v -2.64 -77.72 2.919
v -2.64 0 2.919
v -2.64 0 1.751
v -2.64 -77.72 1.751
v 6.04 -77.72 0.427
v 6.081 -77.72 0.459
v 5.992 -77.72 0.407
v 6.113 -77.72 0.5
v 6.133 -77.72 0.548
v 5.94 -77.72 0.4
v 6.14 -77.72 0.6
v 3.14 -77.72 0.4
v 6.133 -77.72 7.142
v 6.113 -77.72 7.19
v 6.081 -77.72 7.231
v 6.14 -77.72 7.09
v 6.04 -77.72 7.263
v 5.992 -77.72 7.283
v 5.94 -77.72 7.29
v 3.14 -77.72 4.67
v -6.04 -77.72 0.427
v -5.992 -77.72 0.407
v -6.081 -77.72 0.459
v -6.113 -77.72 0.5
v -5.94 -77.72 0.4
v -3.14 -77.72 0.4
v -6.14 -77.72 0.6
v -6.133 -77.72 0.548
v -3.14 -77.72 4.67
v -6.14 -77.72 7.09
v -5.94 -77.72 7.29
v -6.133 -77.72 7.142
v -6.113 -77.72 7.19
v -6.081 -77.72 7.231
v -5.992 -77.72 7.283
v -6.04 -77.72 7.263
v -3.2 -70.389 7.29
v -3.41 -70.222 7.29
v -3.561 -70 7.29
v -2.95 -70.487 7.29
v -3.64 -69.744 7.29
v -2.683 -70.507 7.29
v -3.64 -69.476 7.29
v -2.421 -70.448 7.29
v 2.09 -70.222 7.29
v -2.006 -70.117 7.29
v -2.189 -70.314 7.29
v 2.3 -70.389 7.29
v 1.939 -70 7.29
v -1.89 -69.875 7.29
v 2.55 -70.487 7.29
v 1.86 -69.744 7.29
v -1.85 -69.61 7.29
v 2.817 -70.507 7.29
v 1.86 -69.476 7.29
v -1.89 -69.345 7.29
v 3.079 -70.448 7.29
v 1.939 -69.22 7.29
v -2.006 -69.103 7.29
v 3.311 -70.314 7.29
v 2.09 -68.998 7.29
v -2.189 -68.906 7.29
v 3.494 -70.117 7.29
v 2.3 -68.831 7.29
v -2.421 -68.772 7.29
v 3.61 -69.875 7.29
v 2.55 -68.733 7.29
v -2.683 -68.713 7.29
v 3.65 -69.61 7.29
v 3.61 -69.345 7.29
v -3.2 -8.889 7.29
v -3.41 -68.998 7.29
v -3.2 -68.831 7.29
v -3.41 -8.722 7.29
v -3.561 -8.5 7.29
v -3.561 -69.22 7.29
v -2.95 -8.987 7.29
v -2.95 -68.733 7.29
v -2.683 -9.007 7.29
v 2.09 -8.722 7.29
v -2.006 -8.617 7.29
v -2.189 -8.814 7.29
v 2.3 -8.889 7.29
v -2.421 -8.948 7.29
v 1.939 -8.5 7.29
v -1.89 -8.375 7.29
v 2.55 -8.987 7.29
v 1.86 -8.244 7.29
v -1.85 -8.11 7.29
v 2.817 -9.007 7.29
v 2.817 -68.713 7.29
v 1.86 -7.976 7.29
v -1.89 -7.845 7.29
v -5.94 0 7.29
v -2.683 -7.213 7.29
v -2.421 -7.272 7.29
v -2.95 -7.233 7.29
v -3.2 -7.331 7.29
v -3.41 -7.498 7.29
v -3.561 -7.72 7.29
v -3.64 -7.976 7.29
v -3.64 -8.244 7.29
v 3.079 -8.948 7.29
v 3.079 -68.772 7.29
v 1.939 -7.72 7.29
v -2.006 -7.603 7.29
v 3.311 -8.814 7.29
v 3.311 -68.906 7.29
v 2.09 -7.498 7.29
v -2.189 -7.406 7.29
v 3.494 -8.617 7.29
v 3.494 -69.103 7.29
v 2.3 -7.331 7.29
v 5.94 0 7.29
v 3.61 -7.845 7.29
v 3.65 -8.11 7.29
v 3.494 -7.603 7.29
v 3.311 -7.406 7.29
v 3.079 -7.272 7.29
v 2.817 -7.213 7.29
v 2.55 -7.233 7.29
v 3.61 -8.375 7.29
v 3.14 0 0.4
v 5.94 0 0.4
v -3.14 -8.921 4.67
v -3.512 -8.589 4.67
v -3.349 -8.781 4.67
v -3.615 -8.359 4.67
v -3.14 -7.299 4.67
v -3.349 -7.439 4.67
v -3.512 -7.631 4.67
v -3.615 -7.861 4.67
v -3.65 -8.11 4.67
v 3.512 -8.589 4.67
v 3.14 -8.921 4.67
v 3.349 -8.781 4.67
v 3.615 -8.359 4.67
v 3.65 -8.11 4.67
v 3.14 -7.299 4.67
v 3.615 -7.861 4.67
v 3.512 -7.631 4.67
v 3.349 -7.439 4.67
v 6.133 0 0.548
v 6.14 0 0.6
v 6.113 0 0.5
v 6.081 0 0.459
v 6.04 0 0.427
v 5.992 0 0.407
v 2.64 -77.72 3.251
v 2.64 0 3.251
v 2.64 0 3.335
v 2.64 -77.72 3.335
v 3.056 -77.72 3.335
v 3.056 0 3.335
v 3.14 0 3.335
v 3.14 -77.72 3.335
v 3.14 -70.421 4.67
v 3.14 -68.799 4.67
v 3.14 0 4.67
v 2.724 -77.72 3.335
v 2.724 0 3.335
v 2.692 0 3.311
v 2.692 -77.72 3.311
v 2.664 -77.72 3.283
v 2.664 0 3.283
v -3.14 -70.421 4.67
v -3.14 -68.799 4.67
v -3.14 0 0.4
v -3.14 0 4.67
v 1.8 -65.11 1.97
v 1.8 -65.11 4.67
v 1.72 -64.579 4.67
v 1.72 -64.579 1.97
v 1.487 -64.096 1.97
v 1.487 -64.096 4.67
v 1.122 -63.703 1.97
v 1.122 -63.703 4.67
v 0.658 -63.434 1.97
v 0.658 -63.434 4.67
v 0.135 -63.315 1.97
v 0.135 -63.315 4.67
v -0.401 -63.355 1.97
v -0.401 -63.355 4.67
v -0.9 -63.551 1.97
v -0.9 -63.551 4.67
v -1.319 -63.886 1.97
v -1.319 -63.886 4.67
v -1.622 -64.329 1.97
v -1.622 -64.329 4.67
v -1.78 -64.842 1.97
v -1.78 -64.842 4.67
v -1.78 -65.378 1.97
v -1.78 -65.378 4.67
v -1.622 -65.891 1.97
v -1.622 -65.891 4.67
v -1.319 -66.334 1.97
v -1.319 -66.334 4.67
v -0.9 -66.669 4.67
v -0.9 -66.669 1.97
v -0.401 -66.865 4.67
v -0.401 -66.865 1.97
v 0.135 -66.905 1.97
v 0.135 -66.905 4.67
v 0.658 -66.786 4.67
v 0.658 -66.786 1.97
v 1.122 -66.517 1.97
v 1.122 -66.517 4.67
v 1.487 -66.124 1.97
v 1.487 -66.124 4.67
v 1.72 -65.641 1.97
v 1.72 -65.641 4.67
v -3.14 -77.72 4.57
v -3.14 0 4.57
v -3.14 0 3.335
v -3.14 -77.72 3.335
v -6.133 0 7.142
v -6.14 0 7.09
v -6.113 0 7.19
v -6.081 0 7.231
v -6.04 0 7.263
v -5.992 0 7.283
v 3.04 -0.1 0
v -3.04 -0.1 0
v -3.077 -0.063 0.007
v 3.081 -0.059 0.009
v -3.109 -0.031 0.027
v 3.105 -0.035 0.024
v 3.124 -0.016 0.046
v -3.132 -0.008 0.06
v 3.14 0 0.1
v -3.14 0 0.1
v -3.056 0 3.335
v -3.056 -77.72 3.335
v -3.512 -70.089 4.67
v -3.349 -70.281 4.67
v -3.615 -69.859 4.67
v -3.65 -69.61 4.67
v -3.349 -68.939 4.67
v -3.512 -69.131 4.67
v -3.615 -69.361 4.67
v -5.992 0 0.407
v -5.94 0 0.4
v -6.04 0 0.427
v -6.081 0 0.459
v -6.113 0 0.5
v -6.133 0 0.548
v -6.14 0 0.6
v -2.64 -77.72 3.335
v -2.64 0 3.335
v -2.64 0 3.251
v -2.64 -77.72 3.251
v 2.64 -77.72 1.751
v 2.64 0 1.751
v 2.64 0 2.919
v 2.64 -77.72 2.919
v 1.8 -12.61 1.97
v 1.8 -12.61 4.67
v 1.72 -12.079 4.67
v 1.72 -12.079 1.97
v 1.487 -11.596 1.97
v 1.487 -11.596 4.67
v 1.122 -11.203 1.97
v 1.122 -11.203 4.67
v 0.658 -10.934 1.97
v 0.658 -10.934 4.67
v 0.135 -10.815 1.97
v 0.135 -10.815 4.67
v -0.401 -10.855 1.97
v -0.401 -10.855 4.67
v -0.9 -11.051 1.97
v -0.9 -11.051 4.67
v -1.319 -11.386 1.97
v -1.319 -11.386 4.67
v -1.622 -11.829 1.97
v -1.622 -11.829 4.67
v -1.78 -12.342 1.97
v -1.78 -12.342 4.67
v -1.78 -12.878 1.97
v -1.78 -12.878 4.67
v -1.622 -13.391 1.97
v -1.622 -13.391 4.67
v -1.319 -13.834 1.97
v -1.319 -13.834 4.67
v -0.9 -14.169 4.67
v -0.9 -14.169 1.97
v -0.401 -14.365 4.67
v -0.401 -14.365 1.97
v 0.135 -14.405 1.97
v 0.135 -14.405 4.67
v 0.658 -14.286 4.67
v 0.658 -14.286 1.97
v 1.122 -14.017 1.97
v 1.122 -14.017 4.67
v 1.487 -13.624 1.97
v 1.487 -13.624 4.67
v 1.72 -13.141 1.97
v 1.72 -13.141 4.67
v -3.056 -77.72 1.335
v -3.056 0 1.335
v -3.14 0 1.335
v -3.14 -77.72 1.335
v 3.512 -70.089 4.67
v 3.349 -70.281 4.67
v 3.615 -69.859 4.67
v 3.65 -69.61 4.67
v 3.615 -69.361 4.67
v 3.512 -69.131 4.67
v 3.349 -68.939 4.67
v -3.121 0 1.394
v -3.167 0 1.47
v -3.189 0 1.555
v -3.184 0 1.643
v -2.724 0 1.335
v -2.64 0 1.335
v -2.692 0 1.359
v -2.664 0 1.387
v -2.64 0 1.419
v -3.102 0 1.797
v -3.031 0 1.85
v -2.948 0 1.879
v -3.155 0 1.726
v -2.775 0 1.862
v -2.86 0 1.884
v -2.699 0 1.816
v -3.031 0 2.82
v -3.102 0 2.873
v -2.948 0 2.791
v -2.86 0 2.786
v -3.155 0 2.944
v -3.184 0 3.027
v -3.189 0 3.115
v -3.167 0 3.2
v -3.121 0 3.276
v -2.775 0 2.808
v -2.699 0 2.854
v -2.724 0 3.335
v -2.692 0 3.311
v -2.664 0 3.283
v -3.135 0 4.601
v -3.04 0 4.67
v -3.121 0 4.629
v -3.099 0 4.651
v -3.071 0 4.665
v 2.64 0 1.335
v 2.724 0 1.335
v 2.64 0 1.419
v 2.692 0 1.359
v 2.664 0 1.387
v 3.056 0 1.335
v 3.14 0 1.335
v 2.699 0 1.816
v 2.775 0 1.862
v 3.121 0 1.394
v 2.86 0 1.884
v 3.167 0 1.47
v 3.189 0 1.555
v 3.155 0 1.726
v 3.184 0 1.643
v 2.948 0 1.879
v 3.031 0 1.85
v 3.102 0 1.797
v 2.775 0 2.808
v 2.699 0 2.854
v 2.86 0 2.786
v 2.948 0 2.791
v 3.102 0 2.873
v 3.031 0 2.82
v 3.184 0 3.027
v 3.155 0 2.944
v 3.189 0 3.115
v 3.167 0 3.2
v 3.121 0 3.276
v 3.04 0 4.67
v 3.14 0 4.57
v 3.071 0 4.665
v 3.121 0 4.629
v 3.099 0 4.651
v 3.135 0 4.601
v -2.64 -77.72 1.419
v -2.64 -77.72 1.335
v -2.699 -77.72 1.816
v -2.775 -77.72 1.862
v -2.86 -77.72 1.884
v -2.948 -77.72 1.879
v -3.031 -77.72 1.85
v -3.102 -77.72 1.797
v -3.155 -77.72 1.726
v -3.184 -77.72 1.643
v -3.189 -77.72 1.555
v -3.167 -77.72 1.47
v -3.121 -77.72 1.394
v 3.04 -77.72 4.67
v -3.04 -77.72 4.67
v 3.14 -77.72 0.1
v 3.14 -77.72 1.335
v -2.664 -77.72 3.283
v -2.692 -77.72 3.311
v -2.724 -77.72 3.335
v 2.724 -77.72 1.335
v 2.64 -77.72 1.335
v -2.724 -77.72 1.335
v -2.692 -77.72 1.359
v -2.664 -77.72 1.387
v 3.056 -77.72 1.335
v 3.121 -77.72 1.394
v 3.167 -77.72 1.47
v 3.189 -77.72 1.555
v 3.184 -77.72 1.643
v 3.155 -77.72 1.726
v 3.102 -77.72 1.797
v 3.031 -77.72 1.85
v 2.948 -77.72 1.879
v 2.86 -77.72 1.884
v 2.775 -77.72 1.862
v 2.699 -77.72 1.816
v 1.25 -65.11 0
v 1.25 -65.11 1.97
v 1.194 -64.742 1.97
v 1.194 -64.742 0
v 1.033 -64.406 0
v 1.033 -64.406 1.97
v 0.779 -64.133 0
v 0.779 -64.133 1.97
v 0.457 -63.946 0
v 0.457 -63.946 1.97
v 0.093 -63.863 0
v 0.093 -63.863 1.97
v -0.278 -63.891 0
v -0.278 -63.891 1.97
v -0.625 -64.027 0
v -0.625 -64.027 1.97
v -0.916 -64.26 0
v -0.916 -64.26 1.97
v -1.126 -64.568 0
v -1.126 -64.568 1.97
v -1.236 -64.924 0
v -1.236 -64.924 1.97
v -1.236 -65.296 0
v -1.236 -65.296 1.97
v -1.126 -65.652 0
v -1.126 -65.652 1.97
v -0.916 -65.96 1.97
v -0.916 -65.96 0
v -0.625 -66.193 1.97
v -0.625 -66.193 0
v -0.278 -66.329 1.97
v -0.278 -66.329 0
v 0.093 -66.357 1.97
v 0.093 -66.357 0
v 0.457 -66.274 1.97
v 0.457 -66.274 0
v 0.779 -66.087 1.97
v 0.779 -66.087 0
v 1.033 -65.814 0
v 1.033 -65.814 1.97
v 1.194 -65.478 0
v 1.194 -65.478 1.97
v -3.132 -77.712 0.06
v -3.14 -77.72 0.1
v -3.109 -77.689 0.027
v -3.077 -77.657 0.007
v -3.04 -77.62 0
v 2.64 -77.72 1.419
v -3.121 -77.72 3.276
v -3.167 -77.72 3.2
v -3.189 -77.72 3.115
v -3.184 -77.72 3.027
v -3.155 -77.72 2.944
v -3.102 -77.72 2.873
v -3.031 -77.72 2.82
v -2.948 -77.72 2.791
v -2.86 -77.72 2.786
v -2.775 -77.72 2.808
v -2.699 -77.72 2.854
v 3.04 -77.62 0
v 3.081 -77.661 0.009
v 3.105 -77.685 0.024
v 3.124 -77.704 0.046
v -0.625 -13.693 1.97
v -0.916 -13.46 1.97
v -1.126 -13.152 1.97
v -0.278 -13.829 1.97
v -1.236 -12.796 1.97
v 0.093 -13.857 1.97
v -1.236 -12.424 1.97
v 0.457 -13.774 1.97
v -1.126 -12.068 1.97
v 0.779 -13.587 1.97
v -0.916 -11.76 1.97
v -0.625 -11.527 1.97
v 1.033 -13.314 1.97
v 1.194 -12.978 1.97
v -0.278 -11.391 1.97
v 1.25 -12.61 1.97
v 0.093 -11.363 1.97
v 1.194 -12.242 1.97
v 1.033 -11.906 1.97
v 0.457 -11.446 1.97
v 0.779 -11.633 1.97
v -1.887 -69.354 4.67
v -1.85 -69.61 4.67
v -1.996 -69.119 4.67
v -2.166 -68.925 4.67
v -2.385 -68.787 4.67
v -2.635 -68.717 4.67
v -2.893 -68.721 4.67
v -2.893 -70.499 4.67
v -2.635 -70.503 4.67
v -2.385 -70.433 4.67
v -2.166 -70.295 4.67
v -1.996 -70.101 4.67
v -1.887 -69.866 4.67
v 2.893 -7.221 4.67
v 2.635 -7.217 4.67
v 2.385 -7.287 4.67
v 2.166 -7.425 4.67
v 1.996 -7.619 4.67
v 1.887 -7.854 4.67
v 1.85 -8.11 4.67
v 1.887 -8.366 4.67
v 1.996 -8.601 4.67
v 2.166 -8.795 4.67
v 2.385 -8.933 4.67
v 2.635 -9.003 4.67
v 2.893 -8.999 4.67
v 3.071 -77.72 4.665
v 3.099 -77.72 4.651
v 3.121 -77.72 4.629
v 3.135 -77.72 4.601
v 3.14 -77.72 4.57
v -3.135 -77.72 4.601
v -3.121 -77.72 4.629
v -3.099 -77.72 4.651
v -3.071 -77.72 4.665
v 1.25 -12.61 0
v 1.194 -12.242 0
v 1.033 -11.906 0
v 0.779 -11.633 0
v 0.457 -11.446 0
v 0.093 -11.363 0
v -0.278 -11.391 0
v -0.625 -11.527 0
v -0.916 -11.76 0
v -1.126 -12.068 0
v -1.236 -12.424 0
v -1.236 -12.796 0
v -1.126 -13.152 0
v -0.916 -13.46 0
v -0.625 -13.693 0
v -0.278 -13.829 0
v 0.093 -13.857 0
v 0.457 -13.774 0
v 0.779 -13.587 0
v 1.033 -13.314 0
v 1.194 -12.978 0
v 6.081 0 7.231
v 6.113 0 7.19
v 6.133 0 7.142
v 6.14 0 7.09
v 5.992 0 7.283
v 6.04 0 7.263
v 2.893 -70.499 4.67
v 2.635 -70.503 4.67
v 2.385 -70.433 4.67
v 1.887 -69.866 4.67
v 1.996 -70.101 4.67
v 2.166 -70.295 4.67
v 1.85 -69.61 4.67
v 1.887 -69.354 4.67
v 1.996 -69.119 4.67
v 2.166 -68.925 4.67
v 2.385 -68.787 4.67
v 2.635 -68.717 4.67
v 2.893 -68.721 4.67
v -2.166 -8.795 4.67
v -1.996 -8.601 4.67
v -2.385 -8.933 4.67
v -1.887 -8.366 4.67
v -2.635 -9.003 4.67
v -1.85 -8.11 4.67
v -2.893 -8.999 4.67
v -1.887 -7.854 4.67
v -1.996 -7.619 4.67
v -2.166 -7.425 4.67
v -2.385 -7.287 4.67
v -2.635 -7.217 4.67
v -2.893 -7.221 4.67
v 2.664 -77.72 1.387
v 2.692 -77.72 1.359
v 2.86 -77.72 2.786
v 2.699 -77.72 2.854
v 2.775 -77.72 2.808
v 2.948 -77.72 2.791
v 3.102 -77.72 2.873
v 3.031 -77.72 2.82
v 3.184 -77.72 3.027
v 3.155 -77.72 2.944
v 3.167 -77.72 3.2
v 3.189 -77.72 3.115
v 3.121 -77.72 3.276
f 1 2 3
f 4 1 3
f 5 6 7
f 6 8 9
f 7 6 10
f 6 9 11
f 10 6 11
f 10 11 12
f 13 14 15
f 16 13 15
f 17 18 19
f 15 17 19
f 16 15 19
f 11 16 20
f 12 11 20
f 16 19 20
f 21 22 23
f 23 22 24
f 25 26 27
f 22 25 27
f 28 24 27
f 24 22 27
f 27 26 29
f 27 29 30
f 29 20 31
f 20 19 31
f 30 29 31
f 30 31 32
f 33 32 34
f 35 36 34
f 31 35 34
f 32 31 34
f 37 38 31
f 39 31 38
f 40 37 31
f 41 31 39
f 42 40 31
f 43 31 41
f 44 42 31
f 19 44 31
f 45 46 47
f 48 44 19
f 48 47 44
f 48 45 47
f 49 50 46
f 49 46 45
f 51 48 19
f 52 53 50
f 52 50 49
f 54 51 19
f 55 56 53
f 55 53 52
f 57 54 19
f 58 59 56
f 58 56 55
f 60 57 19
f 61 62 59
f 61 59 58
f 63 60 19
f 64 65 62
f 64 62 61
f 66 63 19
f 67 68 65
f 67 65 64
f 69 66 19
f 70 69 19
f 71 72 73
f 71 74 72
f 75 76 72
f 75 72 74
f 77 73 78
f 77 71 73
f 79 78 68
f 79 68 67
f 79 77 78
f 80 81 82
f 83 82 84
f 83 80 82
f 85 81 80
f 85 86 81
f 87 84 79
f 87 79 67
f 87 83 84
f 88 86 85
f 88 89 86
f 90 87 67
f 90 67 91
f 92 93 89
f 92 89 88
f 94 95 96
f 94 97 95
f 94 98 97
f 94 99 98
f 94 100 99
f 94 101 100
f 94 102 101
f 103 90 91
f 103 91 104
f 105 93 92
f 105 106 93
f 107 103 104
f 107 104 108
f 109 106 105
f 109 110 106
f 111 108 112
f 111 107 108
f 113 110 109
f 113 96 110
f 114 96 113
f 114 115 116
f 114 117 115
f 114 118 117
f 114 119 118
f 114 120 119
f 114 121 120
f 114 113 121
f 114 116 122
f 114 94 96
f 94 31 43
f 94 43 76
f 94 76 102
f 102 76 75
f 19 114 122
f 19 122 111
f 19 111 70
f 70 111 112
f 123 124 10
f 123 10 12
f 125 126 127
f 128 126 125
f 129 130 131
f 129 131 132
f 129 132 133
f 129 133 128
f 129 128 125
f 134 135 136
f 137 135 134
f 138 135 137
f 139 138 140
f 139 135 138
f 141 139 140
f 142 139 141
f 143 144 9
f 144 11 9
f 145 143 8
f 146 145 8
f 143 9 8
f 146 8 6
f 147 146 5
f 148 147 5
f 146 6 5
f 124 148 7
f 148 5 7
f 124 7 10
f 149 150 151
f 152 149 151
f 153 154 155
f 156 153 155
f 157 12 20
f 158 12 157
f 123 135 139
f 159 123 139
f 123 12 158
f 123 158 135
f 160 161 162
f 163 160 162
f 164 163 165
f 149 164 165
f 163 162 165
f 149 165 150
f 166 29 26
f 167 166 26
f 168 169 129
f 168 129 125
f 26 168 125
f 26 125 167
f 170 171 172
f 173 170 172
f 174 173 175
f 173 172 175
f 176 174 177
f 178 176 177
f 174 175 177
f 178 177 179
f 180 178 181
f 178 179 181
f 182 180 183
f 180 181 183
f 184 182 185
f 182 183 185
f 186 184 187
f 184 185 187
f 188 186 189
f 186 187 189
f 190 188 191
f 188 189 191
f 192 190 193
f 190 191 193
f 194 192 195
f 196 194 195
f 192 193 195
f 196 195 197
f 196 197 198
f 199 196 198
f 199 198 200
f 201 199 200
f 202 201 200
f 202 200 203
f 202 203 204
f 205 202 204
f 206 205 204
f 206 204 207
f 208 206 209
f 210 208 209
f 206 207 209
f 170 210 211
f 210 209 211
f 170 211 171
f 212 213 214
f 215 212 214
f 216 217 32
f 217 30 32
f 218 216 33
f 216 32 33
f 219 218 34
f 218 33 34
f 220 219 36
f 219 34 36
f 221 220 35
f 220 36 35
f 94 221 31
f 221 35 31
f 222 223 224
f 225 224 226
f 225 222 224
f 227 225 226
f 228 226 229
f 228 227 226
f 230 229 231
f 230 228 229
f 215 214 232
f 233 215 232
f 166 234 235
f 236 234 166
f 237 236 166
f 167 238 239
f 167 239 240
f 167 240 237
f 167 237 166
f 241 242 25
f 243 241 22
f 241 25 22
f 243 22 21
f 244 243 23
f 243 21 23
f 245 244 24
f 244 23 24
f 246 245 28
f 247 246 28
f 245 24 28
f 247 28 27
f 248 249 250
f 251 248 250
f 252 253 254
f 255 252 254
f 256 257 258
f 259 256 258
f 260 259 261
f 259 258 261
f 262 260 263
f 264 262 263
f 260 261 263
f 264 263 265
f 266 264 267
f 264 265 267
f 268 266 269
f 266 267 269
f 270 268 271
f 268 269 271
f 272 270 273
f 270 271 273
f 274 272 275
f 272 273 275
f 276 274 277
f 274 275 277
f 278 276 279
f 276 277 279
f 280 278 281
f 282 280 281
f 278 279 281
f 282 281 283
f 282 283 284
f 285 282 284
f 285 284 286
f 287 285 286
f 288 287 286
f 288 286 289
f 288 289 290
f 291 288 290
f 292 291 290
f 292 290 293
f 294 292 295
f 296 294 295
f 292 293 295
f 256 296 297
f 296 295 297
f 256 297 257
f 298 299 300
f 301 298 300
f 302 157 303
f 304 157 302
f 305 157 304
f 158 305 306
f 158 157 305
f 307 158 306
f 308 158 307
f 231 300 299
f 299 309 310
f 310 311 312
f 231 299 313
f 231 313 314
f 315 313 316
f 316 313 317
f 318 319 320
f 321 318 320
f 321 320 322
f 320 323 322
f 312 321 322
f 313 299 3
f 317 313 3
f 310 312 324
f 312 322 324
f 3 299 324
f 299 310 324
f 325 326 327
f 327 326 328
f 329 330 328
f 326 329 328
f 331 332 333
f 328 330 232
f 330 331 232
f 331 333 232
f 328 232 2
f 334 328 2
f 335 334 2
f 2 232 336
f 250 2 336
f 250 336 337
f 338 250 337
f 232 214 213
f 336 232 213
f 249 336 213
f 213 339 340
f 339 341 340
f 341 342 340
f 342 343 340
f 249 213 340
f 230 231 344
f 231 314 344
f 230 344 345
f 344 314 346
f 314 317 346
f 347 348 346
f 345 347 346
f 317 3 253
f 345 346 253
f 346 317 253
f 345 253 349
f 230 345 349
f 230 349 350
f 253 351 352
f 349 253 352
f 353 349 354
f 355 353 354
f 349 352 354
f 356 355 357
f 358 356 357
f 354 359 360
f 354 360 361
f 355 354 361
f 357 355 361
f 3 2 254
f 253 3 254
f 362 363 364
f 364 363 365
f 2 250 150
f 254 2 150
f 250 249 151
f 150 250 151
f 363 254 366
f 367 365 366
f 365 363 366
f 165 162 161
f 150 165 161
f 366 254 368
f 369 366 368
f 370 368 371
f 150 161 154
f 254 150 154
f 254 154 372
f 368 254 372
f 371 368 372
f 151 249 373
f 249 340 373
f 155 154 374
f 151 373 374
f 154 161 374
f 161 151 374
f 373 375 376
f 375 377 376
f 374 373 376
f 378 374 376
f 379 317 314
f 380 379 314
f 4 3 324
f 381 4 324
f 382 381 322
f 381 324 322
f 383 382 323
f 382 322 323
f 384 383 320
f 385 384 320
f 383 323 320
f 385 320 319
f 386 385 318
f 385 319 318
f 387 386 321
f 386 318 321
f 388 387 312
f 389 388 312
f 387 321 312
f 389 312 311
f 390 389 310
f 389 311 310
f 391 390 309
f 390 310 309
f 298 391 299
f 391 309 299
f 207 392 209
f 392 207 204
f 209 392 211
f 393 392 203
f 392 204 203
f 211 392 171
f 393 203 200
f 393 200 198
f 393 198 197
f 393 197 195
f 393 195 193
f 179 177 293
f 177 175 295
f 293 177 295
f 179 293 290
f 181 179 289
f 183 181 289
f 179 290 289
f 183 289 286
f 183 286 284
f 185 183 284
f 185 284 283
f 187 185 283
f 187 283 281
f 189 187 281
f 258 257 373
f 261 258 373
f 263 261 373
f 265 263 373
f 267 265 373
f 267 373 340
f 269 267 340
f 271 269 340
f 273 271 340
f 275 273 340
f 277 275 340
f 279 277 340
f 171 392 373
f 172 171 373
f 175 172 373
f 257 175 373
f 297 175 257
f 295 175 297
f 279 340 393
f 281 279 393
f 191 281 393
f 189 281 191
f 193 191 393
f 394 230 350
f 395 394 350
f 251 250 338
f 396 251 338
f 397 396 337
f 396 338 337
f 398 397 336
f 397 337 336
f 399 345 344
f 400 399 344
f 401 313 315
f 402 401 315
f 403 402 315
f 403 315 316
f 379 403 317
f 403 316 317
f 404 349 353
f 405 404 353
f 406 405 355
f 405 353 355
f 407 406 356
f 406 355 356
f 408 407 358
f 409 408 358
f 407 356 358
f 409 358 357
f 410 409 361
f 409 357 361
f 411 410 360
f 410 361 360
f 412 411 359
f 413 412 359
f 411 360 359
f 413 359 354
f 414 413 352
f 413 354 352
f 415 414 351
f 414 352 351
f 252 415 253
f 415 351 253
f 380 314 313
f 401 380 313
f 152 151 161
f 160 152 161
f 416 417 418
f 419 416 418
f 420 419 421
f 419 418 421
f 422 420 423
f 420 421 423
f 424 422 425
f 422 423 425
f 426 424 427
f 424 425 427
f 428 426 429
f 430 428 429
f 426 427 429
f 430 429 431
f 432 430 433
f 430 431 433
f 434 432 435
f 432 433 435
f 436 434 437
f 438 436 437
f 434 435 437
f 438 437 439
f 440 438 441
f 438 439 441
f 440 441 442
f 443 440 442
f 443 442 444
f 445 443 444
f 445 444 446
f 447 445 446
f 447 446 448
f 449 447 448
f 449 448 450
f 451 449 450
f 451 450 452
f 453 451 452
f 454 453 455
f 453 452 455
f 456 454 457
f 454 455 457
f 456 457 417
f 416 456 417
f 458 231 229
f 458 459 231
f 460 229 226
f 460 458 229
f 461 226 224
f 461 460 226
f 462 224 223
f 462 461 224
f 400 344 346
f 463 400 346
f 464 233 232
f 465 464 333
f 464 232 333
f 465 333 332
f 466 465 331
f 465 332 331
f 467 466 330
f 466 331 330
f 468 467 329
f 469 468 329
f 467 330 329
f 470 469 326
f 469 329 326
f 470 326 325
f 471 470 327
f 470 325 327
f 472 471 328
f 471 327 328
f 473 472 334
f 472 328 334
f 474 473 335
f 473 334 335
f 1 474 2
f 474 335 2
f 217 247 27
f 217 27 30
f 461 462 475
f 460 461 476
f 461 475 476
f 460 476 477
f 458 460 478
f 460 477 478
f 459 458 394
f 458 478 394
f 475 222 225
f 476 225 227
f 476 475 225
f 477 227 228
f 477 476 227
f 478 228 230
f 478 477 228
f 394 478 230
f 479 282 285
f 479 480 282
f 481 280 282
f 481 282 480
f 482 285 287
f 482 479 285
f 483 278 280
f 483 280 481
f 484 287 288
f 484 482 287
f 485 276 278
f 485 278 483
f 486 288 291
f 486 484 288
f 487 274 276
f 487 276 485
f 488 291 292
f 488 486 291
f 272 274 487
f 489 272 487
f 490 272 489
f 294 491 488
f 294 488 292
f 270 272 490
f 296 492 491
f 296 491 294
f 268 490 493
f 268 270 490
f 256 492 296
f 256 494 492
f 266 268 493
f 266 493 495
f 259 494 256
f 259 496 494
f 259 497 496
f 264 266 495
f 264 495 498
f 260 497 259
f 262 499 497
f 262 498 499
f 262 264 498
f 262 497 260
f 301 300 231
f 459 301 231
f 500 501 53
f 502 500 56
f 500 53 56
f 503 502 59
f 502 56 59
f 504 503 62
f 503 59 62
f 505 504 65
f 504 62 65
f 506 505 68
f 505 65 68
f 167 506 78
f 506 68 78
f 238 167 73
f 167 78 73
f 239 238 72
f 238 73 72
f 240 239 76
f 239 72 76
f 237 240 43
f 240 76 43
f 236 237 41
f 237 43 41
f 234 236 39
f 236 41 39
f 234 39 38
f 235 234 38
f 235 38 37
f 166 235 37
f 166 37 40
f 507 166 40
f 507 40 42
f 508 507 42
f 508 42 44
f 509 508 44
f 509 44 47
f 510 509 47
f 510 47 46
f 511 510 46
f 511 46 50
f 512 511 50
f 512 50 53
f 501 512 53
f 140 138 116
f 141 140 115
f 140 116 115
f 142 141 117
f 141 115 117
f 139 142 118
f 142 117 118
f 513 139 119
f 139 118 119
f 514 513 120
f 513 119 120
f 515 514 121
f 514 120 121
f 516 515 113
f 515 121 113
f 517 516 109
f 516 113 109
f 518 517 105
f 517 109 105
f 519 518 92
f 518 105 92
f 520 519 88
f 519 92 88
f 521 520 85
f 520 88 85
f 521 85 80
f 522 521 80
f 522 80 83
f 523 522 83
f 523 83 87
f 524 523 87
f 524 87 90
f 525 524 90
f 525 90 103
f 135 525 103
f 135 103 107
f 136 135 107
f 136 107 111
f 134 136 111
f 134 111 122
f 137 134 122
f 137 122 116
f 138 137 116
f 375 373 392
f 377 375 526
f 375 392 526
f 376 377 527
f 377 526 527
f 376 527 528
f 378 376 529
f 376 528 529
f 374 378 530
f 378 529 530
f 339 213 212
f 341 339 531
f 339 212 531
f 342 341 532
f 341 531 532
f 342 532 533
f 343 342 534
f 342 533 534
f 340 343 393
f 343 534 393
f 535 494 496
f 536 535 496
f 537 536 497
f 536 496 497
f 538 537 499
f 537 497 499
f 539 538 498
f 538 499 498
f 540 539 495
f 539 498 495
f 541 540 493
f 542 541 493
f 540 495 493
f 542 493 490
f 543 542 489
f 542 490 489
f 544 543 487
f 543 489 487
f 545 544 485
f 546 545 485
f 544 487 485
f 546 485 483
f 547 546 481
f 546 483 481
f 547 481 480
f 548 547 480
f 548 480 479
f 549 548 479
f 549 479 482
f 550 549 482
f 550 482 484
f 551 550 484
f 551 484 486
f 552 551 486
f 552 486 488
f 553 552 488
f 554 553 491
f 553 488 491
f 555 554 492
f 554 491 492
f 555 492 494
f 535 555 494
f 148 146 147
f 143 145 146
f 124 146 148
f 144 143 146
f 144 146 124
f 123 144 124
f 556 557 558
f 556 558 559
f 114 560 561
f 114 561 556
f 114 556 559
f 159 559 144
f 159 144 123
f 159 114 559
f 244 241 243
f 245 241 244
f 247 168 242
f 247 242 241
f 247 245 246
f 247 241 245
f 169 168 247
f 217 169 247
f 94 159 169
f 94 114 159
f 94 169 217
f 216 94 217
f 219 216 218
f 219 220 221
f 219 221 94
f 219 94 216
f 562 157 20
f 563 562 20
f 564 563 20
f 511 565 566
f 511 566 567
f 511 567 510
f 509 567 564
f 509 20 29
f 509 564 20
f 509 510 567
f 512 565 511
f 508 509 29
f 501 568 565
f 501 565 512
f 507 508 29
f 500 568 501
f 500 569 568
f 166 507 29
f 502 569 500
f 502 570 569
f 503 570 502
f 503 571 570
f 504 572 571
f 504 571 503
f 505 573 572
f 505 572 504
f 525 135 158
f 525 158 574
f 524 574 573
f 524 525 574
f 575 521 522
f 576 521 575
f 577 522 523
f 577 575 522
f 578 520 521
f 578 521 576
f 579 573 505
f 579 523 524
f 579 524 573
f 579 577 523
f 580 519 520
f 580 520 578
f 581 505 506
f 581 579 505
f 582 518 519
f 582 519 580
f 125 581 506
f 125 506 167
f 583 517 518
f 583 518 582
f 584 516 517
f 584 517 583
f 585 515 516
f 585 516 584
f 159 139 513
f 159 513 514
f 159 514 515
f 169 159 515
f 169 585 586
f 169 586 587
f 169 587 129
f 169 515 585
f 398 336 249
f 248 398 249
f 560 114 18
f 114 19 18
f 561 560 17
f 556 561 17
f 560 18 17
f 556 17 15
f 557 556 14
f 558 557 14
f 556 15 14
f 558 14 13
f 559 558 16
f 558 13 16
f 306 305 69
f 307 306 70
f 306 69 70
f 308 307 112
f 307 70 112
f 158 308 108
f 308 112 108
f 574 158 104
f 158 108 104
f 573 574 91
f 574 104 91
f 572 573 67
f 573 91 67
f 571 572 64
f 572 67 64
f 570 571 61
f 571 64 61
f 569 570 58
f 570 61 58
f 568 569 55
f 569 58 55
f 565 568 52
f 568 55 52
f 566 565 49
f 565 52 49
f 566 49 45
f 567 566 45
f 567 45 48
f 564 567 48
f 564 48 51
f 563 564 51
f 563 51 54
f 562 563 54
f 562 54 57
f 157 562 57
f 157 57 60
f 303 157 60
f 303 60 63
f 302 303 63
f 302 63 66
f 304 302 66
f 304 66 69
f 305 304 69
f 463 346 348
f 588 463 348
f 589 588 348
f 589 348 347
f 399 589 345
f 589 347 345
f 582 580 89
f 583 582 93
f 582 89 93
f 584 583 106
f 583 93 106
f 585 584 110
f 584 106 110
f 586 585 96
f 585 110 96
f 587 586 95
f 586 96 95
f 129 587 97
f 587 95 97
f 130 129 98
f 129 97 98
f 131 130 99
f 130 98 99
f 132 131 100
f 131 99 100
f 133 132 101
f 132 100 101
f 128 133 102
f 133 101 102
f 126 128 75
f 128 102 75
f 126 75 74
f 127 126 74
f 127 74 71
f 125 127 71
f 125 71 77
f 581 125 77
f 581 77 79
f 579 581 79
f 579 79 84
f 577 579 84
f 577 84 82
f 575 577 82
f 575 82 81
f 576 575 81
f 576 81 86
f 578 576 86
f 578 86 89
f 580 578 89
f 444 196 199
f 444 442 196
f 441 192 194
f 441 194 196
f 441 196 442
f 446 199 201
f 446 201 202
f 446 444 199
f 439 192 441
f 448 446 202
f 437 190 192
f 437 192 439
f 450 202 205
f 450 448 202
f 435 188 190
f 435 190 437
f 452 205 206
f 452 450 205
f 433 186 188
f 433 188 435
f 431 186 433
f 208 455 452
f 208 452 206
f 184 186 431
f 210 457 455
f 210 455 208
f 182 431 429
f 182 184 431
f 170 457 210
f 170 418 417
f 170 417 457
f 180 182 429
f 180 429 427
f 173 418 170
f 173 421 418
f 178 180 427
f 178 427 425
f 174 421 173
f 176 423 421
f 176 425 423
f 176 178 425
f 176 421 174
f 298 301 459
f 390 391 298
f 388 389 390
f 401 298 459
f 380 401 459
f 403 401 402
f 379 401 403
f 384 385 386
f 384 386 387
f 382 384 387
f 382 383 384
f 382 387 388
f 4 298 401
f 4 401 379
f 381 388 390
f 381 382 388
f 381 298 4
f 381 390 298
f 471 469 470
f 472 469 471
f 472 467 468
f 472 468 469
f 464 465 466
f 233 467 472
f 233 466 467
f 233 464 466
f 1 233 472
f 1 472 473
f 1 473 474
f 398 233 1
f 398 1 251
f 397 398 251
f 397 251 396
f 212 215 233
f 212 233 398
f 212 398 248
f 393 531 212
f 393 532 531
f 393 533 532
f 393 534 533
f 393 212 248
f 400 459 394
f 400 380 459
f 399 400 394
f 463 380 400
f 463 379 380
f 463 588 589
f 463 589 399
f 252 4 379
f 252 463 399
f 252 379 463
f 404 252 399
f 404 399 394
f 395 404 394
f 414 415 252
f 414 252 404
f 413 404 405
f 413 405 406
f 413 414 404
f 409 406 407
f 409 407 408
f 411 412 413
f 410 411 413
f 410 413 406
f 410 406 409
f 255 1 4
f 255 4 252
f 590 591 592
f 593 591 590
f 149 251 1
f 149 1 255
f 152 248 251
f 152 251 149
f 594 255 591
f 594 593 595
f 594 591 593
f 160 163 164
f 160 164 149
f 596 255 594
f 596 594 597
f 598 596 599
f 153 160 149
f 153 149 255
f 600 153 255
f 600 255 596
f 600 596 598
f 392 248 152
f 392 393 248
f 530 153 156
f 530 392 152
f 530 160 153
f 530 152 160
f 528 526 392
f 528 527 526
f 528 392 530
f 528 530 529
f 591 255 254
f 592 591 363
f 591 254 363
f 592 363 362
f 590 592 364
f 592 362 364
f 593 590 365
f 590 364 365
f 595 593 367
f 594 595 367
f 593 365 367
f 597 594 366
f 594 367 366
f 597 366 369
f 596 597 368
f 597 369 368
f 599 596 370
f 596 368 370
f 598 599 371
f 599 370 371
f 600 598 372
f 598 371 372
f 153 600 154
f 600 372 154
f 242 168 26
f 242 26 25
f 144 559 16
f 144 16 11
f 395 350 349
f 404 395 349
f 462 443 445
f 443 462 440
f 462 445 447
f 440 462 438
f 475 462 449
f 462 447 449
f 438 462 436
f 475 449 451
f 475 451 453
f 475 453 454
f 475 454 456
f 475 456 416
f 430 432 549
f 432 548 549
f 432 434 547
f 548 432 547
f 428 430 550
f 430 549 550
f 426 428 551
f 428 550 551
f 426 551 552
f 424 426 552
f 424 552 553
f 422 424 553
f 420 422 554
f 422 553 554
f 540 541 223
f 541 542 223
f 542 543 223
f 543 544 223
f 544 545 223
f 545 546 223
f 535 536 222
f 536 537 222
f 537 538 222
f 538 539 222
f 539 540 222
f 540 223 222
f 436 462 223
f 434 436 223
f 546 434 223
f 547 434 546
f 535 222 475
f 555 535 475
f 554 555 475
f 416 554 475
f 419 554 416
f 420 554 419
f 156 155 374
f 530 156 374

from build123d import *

# Parameters (mm, degrees)
F1_DEPTH  = 77.72
F2_R      = 0.1
F3_R      = 1.8
F4_DEPTH  = 2.7
F5_R      = 1.25
F6_DEPTH  = 1.97
F8_DEPTH  = 77.72
F9_R      = 0.2
F10_R     = 0.9
F11_DEPTH = 2.62


with BuildPart() as f1:
    # F0 (on Front) → F1 (new body)
    with BuildSketch(Plane.XZ):
        with BuildLine():
            Line((-3.14, 1.335), (-3.14, 0))
            Line((-3.14, 0), (3.14, 0))
            Line((3.14, 0), (3.14, 1.335))
            Line((3.14, 1.335), (3.055831, 1.335))
            ThreePointArc((3.055831, 1.335), (3.102132, 1.797132), (2.64, 1.750831))
            Line((2.64, 1.750831), (2.64, 2.919169))
            ThreePointArc((2.64, 2.919169), (3.102132, 2.872868), (3.055831, 3.335))
            Line((3.055831, 3.335), (3.14, 3.335))
            Line((3.14, 3.335), (3.14, 4.67))
            Line((3.14, 4.67), (-3.14, 4.67))
            Line((-3.14, 4.67), (-3.14, 3.335))
            Line((-3.14, 3.335), (-3.055831, 3.335))
            ThreePointArc((-3.055831, 3.335), (-3.102132, 2.872868), (-2.64, 2.919169))
            Line((-2.64, 2.919169), (-2.64, 1.750831))
            ThreePointArc((-2.64, 1.750831), (-3.102132, 1.797132), (-3.055831, 1.335))
            Line((-3.055831, 1.335), (-3.14, 1.335))
        make_face()
        with BuildLine():
            Line((-2.64, 1.419169), (-2.64, 1.335))
            Line((-2.64, 1.335), (-2.724169, 1.335))
            ThreePointArc((-2.724169, 1.335), (-2.677868, 1.372868), (-2.64, 1.419169))
        make_face(mode=Mode.SUBTRACT)
        with BuildLine():
            Line((2.64, 1.335), (2.64, 1.419169))
            ThreePointArc((2.64, 1.419169), (2.677868, 1.372868), (2.724169, 1.335))
            Line((2.724169, 1.335), (2.64, 1.335))
        make_face(mode=Mode.SUBTRACT)
        with BuildLine():
            Line((-2.724169, 3.335), (-2.64, 3.335))
            Line((-2.64, 3.335), (-2.64, 3.250831))
            ThreePointArc((-2.64, 3.250831), (-2.677868, 3.297132), (-2.724169, 3.335))
        make_face(mode=Mode.SUBTRACT)
        with BuildLine():
            ThreePointArc((2.724169, 3.335), (2.677868, 3.297132), (2.64, 3.250831))
            Line((2.64, 3.250831), (2.64, 3.335))
            Line((2.64, 3.335), (2.724169, 3.335))
        make_face(mode=Mode.SUBTRACT)
    extrude(amount=F1_DEPTH)

    # F2
    f2_edges = [f1.edges().sort_by_distance(p)[0] for p in [
        (-3.14, -38.86, 4.67),
        (-3.14, -38.86, 0),
        (3.14, -38.86, 0),
        (0, 0, 0),
        (0, -77.72, 0),
        (3.14, -38.86, 4.67),
    ]]
    fillet(f2_edges, radius=F2_R)

    # F3 (on face) → F4 (cut)
    with BuildSketch(Plane.XY.offset(4.67)):
        with Locations((0, -65.11)):
            Circle(F3_R)
        with Locations((0, -12.61)):
            Circle(F3_R)
    extrude(amount=-F4_DEPTH, mode=Mode.SUBTRACT)

    # F5 (on face) → F6 (cut, through all)
    with BuildSketch(Plane.XY.offset(1.97)):
        with Locations((0, -65.11)):
            Circle(F5_R)
        with Locations((0, -12.61)):
            Circle(F5_R)
    extrude(amount=-F6_DEPTH, mode=Mode.SUBTRACT)


with BuildPart() as f8:
    # F7 (on face) → F8 (new body)
    with BuildSketch(Plane(origin=(0, 0, 0), x_dir=(-1, 0, 0), z_dir=(0, 1, 0))):
        Polygon((3.14, 4.67), (3.14, 0.4), (6.14, 0.4), (6.14, 7.29), (-6.14, 7.29), (-6.14, 0.4), (-3.14, 0.4), (-3.14, 4.67), align=None)
    extrude(amount=-F8_DEPTH)

    # F9
    f9_edges = [f8.edges().sort_by_distance(p)[0] for p in [
        (6.14, -38.86, 7.29),
        (-6.14, -38.86, 7.29),
        (-6.14, -38.86, 0.4),
        (6.14, -38.86, 0.4),
    ]]
    fillet(f9_edges, radius=F9_R)

    # F10 (on face) → F11 (cut, through all)
    with BuildSketch(Plane.XY.offset(7.29)):
        with Locations((-2.75, -8.11)):
            Circle(F10_R)
        with Locations((2.75, -8.11)):
            Circle(F10_R)
        with Locations((-2.75, -69.61)):
            Circle(F10_R)
        with Locations((2.75, -69.61)):
            Circle(F10_R)
    extrude(amount=-F11_DEPTH, mode=Mode.SUBTRACT)


solid = Compound([f1.part, f8.part])
